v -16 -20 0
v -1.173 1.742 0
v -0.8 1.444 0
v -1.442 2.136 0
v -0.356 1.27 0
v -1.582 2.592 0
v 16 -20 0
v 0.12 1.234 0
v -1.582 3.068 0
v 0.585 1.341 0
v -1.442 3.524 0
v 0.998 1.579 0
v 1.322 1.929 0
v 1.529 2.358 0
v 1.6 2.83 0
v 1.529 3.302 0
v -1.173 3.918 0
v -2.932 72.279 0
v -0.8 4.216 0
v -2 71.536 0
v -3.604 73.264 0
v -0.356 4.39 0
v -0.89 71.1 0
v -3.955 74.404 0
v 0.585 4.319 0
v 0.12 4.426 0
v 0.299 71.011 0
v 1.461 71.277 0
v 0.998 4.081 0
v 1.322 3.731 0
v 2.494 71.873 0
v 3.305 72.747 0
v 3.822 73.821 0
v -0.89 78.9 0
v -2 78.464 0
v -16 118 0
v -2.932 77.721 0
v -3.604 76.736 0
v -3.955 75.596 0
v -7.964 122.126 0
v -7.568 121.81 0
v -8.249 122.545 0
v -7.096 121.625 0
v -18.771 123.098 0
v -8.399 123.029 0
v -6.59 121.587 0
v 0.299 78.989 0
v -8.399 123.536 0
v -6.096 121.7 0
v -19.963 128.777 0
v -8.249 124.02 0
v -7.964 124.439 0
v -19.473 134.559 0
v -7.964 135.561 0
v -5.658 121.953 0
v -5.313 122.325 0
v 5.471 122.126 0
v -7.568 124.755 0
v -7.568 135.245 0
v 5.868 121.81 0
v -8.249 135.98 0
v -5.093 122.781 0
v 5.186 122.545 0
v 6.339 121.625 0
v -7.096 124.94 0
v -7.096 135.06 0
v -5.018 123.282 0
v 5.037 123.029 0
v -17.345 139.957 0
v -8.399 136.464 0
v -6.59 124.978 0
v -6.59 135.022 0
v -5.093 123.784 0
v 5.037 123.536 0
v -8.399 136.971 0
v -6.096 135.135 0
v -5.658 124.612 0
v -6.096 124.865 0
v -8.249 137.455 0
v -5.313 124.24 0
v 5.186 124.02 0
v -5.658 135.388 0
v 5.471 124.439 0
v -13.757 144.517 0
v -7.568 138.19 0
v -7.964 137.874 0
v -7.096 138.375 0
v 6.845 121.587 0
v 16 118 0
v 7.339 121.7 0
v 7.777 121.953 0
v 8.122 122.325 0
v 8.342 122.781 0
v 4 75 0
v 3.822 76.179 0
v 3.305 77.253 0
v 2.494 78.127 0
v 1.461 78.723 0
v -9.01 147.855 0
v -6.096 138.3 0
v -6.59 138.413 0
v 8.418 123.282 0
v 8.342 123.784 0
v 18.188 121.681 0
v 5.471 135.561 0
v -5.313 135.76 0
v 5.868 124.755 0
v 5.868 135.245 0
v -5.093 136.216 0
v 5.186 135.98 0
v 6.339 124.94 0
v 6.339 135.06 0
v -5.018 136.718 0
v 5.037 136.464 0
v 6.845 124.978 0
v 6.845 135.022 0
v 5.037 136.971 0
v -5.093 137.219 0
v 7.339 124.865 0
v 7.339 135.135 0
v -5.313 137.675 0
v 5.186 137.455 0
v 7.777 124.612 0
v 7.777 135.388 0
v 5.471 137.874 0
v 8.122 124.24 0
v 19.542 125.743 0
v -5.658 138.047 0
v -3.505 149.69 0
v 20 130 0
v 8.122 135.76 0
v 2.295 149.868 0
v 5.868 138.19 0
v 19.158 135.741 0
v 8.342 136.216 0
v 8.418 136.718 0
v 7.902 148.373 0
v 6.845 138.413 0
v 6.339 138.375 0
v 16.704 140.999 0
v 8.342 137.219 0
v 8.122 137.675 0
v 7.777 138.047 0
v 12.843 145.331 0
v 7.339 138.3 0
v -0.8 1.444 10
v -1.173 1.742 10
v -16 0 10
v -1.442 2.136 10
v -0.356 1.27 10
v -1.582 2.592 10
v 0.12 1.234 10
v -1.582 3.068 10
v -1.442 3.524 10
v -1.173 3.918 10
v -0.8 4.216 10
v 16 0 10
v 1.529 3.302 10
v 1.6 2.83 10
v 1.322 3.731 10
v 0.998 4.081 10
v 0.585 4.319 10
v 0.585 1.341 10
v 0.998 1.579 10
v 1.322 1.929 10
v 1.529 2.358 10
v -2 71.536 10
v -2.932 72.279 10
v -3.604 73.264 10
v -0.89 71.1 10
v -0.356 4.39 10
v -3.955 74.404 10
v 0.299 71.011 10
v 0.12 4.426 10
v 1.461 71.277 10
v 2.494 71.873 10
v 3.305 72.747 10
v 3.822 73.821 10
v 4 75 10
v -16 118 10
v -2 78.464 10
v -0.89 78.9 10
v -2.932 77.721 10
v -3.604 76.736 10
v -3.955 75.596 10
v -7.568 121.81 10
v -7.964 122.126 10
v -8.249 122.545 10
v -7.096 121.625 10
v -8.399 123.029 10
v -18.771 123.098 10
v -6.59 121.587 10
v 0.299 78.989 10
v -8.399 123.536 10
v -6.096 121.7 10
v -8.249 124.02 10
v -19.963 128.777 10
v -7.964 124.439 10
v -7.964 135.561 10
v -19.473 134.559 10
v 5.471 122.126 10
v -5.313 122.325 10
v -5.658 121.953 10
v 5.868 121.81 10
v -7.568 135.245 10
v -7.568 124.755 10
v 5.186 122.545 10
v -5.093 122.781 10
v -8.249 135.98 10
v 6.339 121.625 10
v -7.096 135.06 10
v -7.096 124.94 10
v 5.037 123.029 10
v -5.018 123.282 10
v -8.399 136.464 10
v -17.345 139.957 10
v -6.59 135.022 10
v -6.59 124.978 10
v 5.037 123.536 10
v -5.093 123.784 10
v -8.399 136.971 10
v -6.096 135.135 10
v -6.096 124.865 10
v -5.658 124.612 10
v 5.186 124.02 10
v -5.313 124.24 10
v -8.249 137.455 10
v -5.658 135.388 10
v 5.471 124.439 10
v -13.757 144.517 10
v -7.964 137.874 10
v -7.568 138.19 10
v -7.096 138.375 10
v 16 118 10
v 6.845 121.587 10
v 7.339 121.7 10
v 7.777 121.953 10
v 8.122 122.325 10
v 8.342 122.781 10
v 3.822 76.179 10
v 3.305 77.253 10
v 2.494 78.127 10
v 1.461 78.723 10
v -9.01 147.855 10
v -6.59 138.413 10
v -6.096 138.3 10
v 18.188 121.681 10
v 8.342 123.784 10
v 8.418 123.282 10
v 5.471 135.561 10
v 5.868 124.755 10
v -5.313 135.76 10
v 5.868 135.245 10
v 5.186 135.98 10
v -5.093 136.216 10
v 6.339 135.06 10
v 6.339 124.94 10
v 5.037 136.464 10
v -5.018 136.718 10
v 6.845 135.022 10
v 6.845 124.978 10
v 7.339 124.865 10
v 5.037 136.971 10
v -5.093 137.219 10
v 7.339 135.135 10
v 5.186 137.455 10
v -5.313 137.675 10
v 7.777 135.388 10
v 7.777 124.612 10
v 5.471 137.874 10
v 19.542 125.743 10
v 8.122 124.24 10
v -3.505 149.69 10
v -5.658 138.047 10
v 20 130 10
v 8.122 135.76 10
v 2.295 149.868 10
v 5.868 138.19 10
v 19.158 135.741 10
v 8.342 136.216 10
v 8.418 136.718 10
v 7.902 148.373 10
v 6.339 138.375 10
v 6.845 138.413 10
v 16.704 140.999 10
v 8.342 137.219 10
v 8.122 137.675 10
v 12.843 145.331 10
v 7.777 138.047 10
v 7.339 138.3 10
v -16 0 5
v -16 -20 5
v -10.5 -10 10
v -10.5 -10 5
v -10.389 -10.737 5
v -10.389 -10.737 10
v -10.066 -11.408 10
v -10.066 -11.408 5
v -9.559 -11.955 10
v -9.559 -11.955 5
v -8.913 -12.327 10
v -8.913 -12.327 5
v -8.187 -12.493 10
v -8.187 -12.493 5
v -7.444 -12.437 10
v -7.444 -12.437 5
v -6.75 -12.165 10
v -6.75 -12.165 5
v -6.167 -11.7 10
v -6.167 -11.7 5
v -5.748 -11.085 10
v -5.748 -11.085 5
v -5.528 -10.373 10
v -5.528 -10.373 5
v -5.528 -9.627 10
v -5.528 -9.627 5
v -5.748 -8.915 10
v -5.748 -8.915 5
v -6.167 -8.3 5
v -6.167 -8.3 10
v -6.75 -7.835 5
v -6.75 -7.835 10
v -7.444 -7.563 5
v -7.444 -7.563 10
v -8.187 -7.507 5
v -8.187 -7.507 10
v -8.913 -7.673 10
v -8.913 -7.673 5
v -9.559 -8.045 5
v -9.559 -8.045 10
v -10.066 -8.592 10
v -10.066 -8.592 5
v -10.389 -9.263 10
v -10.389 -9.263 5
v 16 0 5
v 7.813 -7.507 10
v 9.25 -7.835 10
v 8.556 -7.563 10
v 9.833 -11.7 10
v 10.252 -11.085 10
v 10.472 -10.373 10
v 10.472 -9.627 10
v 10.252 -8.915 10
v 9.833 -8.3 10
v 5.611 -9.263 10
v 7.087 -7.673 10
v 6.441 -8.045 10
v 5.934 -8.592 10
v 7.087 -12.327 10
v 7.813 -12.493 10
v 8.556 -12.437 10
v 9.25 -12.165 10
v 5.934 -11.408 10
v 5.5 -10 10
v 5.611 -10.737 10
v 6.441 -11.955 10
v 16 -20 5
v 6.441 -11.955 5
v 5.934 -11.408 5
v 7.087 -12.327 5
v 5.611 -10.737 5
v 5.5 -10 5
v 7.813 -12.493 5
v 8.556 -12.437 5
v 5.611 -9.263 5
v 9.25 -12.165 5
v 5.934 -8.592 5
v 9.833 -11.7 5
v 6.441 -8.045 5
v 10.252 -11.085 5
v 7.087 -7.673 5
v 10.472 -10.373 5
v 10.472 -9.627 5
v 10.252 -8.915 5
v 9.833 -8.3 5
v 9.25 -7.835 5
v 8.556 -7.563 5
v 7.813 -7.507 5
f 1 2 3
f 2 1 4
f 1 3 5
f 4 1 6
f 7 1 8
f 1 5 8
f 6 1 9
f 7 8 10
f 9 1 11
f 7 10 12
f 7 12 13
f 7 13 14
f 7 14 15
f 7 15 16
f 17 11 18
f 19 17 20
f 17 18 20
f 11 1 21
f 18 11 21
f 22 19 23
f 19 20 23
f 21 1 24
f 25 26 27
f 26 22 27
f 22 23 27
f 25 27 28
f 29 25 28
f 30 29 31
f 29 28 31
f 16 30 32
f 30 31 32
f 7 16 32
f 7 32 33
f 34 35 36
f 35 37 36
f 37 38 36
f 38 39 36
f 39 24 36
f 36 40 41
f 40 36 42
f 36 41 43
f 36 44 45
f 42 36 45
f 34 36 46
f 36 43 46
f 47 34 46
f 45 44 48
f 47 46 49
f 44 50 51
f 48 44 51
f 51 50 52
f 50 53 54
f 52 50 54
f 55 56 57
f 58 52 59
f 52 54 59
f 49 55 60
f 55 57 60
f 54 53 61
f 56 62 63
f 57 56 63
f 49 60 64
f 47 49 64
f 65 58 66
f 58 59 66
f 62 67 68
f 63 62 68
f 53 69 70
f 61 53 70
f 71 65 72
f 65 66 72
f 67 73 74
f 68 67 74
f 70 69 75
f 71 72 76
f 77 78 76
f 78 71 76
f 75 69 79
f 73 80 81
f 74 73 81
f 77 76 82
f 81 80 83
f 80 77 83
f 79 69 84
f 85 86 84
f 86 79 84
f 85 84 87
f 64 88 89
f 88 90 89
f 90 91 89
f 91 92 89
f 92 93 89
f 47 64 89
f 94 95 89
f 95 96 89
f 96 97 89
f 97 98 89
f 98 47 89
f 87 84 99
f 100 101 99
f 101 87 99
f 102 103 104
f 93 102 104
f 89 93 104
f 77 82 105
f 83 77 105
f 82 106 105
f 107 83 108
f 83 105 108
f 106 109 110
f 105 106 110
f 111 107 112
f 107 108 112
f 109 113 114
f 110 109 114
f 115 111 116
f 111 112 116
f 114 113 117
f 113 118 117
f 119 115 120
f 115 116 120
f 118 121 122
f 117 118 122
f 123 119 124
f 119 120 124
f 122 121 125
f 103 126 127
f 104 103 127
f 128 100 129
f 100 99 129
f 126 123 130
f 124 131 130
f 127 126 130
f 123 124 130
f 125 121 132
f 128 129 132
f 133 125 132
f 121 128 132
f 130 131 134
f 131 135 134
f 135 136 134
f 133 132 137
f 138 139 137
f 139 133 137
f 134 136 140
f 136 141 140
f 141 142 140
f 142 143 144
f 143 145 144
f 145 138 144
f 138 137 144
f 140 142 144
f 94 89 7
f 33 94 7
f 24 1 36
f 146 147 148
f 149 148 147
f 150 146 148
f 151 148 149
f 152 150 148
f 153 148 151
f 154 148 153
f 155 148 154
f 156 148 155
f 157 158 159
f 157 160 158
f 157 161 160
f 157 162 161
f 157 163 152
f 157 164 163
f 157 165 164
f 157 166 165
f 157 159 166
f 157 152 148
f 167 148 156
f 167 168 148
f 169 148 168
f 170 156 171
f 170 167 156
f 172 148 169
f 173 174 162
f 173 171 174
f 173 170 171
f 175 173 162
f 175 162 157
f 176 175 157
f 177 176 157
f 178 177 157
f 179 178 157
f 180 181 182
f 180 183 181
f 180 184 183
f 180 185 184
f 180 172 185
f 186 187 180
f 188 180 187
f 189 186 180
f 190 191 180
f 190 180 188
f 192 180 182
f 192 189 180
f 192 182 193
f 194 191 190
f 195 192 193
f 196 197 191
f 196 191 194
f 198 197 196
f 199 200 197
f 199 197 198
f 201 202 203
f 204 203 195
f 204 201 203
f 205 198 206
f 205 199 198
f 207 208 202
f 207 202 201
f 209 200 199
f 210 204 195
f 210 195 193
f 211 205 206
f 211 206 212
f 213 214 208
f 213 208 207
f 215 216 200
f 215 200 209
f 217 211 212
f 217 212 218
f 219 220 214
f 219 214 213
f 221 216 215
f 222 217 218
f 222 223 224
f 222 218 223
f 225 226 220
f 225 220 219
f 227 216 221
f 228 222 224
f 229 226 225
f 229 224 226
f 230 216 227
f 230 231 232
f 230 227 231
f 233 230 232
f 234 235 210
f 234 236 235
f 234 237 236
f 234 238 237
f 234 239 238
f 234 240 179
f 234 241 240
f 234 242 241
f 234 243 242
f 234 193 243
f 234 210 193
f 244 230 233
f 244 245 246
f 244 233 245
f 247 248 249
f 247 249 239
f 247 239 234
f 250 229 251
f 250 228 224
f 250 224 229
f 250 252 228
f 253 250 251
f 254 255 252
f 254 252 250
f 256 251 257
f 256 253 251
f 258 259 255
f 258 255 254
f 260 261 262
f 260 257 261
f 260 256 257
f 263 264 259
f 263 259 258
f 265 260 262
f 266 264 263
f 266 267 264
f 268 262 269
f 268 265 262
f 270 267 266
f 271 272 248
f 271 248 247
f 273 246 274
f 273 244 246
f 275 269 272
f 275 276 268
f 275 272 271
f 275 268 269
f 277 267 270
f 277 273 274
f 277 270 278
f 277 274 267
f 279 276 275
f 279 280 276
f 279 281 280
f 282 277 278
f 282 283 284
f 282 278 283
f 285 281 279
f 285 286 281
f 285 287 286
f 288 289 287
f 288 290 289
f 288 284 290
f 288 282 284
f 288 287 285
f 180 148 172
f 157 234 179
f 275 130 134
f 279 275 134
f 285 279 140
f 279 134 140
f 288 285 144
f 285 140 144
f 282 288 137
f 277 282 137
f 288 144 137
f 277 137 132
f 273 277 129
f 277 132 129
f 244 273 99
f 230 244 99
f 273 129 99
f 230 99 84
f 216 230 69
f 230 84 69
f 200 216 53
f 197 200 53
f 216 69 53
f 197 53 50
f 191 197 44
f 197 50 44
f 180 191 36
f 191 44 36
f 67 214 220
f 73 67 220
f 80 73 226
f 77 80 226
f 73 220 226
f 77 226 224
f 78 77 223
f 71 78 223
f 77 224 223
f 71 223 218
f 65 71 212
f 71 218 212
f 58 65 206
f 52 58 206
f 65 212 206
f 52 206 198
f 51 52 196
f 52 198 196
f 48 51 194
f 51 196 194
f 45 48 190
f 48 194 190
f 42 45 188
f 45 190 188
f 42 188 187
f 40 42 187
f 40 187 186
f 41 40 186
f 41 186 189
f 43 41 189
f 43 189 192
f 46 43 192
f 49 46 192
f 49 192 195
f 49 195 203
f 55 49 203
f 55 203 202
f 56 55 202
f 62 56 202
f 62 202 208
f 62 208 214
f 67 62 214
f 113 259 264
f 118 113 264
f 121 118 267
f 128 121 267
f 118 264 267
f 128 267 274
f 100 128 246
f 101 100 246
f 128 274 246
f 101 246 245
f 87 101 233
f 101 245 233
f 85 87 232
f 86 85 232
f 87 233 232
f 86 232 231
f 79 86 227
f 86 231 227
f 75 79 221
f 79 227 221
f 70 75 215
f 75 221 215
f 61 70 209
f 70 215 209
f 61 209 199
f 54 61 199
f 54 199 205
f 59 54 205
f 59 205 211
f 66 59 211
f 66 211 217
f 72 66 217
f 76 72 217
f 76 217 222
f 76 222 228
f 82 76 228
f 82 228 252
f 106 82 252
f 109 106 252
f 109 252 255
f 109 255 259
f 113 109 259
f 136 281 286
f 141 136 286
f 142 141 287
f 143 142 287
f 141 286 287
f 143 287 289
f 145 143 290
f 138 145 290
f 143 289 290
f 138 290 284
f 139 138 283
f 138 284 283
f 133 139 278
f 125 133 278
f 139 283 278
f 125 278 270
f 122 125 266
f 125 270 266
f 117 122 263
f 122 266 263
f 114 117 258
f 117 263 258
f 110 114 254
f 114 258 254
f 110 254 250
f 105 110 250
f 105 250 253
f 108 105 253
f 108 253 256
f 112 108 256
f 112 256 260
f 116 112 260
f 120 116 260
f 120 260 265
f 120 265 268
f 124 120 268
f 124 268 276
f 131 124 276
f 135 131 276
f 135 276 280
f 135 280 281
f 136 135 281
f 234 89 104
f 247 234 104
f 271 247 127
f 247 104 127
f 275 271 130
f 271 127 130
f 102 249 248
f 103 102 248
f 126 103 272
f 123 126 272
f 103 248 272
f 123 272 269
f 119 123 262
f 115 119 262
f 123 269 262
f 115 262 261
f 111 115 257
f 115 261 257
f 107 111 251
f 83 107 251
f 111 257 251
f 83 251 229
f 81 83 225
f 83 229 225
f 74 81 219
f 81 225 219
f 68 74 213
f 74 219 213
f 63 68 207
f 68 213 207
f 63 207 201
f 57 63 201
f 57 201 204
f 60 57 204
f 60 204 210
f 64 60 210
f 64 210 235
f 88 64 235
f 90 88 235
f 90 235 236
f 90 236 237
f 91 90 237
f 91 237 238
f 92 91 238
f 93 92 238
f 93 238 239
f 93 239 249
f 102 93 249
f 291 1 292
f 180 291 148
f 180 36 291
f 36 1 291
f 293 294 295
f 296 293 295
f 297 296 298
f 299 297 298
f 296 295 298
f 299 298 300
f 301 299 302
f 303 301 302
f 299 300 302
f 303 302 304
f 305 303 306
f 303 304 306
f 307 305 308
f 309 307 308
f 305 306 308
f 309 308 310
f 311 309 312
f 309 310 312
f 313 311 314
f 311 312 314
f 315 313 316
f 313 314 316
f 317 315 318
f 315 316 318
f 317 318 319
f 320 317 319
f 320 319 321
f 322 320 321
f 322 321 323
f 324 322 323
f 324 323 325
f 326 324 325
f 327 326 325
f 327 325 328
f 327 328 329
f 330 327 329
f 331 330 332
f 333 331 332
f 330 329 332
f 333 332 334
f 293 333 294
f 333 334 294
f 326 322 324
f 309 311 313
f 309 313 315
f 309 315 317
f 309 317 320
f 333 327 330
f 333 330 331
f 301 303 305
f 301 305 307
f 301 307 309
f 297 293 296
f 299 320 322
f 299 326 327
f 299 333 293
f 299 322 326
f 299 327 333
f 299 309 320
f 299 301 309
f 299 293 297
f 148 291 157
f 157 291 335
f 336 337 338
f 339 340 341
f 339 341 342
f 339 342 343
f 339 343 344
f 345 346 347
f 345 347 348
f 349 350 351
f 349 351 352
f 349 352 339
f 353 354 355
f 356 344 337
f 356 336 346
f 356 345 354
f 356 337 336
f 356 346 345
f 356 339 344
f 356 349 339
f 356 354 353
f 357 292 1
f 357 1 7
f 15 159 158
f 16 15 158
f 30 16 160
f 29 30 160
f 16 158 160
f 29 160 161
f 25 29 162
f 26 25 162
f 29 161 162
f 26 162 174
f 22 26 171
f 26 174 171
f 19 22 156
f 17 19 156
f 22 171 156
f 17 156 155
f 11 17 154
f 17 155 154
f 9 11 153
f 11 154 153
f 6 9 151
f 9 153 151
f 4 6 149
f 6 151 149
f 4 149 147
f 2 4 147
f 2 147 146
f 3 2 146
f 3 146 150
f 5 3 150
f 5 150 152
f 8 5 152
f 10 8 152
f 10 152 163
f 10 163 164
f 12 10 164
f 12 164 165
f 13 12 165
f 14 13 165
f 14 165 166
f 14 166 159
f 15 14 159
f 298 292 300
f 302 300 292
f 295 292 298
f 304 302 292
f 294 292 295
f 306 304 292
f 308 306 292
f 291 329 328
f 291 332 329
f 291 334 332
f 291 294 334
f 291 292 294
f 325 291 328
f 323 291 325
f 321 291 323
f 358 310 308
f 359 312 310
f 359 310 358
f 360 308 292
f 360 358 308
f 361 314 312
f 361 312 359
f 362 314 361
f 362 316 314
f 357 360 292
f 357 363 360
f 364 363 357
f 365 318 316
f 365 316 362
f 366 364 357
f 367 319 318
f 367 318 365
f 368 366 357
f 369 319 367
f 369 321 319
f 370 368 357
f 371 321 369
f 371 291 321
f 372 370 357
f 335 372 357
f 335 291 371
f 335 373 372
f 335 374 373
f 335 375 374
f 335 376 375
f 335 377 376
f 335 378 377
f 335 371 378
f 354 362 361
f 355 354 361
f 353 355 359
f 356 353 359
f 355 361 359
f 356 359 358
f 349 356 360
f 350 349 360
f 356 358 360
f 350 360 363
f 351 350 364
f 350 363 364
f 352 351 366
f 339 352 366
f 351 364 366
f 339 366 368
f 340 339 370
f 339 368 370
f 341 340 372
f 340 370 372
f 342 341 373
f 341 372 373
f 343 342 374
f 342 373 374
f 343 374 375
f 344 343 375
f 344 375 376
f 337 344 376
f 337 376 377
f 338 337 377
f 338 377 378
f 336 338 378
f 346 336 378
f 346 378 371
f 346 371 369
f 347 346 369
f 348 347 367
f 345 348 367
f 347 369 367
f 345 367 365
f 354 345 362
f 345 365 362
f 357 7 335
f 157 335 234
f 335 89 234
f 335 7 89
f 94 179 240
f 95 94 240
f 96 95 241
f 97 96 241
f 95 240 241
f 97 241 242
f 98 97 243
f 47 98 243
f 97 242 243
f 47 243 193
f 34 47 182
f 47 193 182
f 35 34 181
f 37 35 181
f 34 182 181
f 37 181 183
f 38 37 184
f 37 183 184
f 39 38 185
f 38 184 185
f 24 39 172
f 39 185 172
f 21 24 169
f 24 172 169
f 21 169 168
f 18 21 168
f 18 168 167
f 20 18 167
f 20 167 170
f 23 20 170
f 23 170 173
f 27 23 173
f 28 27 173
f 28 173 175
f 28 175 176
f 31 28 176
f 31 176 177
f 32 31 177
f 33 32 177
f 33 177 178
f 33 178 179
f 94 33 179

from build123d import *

# Parameters (mm, degrees)
BOSS_EXTRU_1_DEPTH      = 10
ESQUISSE3_W             = 32
ESQUISSE3_H             = 5
BOSS_EXTRU_2_DEPTH      = 20
ESQUISSE4_R             = 2.5
BOSS_EXTRU_3_DEPTH      = 5
ESQUISSE6_R             = 1.7
ESQUISSE6_R_2           = 4
ESQUISSE6_R_3           = 1.6
ENL_V_MAT_EXTRU_1_DEPTH = 152.657508881


with BuildPart() as part:
    # Esquisse1 → Boss.-Extru.1 (new body)
    with BuildSketch(Plane.XY):
        with BuildLine():
            ThreePointArc((-16, 118), (0, 110), (16, 118))
            Line((16, 118), (16, 130))
            Line((16, 130), (-16, 130))
            Line((-16, 130), (-16, 118))
        make_face()
        with BuildLine():
            Line((16, 130), (16, 118))
            ThreePointArc((16, 118), (18.973665961, 123.67544468), (20, 130))
            ThreePointArc((20, 130), (-6.32455532, 148.973665961), (-16, 118))
            Line((-16, 118), (-16, 130))
            Line((-16, 130), (16, 130))
        make_face()
        with BuildLine():
            Line((-16, 0), (16, 0))
            Line((16, 0), (16, 118))
            ThreePointArc((16, 118), (0, 110), (-16, 118))
            Line((-16, 118), (-16, 0))
        make_face()
    extrude(amount=BOSS_EXTRU_1_DEPTH)

    # Esquisse3 → Boss.-Extru.2 (add)
    with BuildSketch(Plane.XZ):
        with Locations((0, 2.5)):
            Rectangle(ESQUISSE3_W, ESQUISSE3_H)
    extrude(amount=BOSS_EXTRU_2_DEPTH)

    # Esquisse4 → Boss.-Extru.3 (add)
    with BuildSketch(Plane.XY.offset(5)):
        with Locations(Location((-8, -10, 0), (0, 0, 180))):
            Circle(ESQUISSE4_R)
        with Locations(Location((8, -10, 0), (0, 0, 180))):
            Circle(ESQUISSE4_R)
    extrude(amount=BOSS_EXTRU_3_DEPTH)

    # Esquisse6 → Enlèv. mat.-Extru.1 (cut, through all)
    with BuildSketch(Plane.XY.offset(10)):
        with Locations((-6.717514421, 136.717514421)):
            Circle(ESQUISSE6_R)
        with Locations((6.717514421, 136.717514421)):
            Circle(ESQUISSE6_R)
        with Locations((6.717514421, 123.282485579)):
            Circle(ESQUISSE6_R)
        with Locations((-6.717514421, 123.282485579)):
            Circle(ESQUISSE6_R)
        with Locations((0, 75)):
            Circle(ESQUISSE6_R_2)
        with Locations((0, 2.83)):
            Circle(ESQUISSE6_R_3)
    extrude(amount=-ENL_V_MAT_EXTRU_1_DEPTH, mode=Mode.SUBTRACT)


solid = part.part
